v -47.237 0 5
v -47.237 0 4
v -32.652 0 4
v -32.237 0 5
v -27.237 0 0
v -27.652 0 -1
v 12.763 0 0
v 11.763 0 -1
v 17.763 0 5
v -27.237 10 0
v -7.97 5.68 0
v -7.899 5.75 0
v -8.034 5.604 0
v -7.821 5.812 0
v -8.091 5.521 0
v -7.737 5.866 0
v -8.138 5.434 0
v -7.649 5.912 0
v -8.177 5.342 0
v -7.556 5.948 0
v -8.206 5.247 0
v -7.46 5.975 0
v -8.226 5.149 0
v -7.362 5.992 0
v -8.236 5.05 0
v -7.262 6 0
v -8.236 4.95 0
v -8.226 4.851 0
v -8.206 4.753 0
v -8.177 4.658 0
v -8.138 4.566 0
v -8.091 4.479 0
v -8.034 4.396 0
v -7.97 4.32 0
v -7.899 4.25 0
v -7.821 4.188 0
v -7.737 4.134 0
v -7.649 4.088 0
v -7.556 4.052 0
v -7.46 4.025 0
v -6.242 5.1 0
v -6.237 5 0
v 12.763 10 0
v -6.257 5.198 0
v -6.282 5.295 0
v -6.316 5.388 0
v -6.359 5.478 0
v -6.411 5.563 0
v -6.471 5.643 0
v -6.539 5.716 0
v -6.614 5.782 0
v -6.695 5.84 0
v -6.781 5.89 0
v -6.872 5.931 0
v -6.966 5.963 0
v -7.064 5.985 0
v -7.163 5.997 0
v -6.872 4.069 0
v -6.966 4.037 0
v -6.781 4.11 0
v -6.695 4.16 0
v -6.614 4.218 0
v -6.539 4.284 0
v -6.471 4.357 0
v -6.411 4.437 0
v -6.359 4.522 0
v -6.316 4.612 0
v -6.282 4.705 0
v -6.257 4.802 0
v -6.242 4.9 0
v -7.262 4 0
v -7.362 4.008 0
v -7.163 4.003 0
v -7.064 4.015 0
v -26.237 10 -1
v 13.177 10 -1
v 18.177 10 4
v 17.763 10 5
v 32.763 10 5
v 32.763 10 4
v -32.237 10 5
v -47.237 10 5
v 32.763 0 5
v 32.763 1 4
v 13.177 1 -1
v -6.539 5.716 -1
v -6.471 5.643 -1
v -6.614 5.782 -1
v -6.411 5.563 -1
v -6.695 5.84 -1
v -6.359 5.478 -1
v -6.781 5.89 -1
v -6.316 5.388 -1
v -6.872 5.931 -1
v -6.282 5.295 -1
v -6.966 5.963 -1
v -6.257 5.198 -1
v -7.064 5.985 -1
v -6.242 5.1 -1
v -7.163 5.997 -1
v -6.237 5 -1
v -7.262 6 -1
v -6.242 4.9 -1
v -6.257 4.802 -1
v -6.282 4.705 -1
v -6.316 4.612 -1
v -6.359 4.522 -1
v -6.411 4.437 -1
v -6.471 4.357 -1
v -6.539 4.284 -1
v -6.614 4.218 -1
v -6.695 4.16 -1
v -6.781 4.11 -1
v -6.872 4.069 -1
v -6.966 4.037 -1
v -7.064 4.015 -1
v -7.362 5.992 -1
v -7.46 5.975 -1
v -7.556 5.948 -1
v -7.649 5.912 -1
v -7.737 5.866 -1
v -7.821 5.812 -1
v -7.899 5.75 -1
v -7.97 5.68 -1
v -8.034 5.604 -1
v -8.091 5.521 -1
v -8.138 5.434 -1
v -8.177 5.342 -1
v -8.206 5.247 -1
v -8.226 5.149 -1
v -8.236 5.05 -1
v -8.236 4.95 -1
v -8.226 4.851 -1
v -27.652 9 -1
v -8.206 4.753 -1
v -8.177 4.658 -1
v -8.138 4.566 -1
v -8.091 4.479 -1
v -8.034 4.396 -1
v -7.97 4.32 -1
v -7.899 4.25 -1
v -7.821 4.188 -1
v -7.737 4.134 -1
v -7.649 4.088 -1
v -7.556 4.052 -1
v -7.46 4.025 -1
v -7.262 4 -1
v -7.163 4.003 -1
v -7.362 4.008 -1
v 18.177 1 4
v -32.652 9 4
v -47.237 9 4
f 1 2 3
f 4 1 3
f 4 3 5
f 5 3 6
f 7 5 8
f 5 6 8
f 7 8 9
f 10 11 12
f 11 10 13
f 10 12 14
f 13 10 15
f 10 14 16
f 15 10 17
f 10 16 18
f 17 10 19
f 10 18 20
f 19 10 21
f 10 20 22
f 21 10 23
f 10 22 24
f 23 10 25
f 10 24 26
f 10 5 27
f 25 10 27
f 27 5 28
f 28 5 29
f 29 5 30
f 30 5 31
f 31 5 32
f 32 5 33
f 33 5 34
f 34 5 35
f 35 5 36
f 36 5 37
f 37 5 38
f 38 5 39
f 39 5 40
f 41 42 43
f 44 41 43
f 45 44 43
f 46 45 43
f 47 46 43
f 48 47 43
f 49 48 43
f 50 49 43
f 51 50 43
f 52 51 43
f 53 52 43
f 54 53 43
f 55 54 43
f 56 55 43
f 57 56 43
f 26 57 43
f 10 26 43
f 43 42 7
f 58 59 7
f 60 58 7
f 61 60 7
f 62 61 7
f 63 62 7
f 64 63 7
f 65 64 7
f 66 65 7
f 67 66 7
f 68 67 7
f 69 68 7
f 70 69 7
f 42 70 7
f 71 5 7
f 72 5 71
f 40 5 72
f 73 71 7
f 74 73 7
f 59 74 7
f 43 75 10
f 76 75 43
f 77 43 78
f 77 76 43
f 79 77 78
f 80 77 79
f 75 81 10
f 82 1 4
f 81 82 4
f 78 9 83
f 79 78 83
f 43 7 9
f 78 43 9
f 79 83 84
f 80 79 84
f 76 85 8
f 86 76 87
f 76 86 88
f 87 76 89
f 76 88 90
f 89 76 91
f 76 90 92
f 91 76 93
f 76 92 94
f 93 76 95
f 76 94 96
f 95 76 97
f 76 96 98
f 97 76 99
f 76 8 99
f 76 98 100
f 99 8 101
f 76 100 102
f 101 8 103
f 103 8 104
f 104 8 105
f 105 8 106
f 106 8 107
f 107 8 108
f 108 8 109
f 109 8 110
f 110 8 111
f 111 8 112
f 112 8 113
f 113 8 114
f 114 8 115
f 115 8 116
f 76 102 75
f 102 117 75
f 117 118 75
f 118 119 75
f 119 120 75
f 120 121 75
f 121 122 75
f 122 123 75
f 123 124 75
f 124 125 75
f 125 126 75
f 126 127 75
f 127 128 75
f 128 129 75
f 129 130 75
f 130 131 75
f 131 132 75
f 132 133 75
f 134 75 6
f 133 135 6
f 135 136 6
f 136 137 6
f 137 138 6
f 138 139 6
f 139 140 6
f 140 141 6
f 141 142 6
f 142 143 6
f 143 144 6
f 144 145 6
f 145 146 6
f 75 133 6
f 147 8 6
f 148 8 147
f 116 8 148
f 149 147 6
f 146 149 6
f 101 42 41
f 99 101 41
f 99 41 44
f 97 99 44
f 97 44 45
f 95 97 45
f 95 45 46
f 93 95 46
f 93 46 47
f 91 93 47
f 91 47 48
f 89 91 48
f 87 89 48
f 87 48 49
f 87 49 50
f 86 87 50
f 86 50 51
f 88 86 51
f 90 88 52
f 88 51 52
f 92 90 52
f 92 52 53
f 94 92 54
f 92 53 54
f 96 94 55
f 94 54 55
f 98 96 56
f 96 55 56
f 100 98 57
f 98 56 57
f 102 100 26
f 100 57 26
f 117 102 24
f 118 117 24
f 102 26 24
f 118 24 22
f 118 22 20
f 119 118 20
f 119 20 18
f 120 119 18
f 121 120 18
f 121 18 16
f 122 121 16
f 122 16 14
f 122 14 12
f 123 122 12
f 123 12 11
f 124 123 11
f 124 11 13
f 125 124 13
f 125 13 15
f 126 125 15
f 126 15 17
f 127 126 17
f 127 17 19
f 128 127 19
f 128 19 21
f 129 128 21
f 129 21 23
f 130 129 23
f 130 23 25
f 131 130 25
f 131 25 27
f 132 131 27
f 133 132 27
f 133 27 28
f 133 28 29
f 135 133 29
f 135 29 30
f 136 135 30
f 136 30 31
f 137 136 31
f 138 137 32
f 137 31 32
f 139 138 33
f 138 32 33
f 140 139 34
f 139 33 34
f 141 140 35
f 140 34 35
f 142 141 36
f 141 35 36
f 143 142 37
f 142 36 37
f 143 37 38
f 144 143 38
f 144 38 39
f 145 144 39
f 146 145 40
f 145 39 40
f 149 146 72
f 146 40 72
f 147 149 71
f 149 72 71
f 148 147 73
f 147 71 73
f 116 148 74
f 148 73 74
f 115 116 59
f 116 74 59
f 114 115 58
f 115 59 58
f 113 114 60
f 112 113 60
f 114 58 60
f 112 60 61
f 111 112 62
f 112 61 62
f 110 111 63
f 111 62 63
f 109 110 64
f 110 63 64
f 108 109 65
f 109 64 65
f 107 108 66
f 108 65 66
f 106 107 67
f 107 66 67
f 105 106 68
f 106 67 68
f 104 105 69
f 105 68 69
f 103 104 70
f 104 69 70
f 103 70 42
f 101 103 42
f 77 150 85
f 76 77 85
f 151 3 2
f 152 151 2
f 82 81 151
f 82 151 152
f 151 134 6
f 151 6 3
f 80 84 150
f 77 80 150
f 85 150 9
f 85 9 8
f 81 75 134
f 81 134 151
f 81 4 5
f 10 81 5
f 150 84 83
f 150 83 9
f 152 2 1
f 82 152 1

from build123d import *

# Parameters (mm, degrees)
BOTTOM_BLADE_EXTRUDE_DEPTH        = 10
BOTTOM_BLADE_CUT_1_SIZE           = 1
BOTTOM_BLADE_CUT_2_SIZE           = 1
SKETCH3_R                         = 1
HOLE_FOR_SCREW_BOTTOM_BLADE_DEPTH = 20


with BuildPart() as part:
    # Sketch2 → Bottom Blade Extrude (new body)
    with BuildSketch(Plane(origin=(0, 0, 0), x_dir=(1, 0, 0), z_dir=(0, 1, 0))):
        Polygon((-27.237322503, 0), (12.762677497, 0), (17.762677497, -5), (32.762677497, -5), (32.762677497, -4), (18.17689106, -4), (13.17689106, 1), (-27.651536065, 1), (-32.651536065, -4), (-47.237322503, -4), (-47.237322503, -5), (-32.237322503, -5), align=None)
    extrude(amount=BOTTOM_BLADE_EXTRUDE_DEPTH)

    # Bottom Blade Cut 1
    bottom_blade_cut_1_edges = [part.edges().sort_by_distance(p)[0] for p in [
        (-30.151536065, 10, 1.5),
        (-39.944429284, 10, 4),
    ]]
    chamfer(bottom_blade_cut_1_edges, length=BOTTOM_BLADE_CUT_1_SIZE - 0.0001)  # a hair under: the kernel refuses the full size

    # Bottom Blade Cut 2
    bottom_blade_cut_2_edges = [part.edges().sort_by_distance(p)[0] for p in [
        (15.67689106, 0, 1.5),
        (25.469784279, 0, 4),
    ]]
    chamfer(bottom_blade_cut_2_edges, length=BOTTOM_BLADE_CUT_2_SIZE - 0.0001)  # a hair under: the kernel refuses the full size

    # Sketch3 → Hole for Screw ( Bottom Blade) (cut)
    with BuildSketch(Plane.XY):
        with Locations((-7.237322503, 5)):
            Circle(SKETCH3_R)
    extrude(amount=-HOLE_FOR_SCREW_BOTTOM_BLADE_DEPTH, mode=Mode.SUBTRACT)


solid = part.part
